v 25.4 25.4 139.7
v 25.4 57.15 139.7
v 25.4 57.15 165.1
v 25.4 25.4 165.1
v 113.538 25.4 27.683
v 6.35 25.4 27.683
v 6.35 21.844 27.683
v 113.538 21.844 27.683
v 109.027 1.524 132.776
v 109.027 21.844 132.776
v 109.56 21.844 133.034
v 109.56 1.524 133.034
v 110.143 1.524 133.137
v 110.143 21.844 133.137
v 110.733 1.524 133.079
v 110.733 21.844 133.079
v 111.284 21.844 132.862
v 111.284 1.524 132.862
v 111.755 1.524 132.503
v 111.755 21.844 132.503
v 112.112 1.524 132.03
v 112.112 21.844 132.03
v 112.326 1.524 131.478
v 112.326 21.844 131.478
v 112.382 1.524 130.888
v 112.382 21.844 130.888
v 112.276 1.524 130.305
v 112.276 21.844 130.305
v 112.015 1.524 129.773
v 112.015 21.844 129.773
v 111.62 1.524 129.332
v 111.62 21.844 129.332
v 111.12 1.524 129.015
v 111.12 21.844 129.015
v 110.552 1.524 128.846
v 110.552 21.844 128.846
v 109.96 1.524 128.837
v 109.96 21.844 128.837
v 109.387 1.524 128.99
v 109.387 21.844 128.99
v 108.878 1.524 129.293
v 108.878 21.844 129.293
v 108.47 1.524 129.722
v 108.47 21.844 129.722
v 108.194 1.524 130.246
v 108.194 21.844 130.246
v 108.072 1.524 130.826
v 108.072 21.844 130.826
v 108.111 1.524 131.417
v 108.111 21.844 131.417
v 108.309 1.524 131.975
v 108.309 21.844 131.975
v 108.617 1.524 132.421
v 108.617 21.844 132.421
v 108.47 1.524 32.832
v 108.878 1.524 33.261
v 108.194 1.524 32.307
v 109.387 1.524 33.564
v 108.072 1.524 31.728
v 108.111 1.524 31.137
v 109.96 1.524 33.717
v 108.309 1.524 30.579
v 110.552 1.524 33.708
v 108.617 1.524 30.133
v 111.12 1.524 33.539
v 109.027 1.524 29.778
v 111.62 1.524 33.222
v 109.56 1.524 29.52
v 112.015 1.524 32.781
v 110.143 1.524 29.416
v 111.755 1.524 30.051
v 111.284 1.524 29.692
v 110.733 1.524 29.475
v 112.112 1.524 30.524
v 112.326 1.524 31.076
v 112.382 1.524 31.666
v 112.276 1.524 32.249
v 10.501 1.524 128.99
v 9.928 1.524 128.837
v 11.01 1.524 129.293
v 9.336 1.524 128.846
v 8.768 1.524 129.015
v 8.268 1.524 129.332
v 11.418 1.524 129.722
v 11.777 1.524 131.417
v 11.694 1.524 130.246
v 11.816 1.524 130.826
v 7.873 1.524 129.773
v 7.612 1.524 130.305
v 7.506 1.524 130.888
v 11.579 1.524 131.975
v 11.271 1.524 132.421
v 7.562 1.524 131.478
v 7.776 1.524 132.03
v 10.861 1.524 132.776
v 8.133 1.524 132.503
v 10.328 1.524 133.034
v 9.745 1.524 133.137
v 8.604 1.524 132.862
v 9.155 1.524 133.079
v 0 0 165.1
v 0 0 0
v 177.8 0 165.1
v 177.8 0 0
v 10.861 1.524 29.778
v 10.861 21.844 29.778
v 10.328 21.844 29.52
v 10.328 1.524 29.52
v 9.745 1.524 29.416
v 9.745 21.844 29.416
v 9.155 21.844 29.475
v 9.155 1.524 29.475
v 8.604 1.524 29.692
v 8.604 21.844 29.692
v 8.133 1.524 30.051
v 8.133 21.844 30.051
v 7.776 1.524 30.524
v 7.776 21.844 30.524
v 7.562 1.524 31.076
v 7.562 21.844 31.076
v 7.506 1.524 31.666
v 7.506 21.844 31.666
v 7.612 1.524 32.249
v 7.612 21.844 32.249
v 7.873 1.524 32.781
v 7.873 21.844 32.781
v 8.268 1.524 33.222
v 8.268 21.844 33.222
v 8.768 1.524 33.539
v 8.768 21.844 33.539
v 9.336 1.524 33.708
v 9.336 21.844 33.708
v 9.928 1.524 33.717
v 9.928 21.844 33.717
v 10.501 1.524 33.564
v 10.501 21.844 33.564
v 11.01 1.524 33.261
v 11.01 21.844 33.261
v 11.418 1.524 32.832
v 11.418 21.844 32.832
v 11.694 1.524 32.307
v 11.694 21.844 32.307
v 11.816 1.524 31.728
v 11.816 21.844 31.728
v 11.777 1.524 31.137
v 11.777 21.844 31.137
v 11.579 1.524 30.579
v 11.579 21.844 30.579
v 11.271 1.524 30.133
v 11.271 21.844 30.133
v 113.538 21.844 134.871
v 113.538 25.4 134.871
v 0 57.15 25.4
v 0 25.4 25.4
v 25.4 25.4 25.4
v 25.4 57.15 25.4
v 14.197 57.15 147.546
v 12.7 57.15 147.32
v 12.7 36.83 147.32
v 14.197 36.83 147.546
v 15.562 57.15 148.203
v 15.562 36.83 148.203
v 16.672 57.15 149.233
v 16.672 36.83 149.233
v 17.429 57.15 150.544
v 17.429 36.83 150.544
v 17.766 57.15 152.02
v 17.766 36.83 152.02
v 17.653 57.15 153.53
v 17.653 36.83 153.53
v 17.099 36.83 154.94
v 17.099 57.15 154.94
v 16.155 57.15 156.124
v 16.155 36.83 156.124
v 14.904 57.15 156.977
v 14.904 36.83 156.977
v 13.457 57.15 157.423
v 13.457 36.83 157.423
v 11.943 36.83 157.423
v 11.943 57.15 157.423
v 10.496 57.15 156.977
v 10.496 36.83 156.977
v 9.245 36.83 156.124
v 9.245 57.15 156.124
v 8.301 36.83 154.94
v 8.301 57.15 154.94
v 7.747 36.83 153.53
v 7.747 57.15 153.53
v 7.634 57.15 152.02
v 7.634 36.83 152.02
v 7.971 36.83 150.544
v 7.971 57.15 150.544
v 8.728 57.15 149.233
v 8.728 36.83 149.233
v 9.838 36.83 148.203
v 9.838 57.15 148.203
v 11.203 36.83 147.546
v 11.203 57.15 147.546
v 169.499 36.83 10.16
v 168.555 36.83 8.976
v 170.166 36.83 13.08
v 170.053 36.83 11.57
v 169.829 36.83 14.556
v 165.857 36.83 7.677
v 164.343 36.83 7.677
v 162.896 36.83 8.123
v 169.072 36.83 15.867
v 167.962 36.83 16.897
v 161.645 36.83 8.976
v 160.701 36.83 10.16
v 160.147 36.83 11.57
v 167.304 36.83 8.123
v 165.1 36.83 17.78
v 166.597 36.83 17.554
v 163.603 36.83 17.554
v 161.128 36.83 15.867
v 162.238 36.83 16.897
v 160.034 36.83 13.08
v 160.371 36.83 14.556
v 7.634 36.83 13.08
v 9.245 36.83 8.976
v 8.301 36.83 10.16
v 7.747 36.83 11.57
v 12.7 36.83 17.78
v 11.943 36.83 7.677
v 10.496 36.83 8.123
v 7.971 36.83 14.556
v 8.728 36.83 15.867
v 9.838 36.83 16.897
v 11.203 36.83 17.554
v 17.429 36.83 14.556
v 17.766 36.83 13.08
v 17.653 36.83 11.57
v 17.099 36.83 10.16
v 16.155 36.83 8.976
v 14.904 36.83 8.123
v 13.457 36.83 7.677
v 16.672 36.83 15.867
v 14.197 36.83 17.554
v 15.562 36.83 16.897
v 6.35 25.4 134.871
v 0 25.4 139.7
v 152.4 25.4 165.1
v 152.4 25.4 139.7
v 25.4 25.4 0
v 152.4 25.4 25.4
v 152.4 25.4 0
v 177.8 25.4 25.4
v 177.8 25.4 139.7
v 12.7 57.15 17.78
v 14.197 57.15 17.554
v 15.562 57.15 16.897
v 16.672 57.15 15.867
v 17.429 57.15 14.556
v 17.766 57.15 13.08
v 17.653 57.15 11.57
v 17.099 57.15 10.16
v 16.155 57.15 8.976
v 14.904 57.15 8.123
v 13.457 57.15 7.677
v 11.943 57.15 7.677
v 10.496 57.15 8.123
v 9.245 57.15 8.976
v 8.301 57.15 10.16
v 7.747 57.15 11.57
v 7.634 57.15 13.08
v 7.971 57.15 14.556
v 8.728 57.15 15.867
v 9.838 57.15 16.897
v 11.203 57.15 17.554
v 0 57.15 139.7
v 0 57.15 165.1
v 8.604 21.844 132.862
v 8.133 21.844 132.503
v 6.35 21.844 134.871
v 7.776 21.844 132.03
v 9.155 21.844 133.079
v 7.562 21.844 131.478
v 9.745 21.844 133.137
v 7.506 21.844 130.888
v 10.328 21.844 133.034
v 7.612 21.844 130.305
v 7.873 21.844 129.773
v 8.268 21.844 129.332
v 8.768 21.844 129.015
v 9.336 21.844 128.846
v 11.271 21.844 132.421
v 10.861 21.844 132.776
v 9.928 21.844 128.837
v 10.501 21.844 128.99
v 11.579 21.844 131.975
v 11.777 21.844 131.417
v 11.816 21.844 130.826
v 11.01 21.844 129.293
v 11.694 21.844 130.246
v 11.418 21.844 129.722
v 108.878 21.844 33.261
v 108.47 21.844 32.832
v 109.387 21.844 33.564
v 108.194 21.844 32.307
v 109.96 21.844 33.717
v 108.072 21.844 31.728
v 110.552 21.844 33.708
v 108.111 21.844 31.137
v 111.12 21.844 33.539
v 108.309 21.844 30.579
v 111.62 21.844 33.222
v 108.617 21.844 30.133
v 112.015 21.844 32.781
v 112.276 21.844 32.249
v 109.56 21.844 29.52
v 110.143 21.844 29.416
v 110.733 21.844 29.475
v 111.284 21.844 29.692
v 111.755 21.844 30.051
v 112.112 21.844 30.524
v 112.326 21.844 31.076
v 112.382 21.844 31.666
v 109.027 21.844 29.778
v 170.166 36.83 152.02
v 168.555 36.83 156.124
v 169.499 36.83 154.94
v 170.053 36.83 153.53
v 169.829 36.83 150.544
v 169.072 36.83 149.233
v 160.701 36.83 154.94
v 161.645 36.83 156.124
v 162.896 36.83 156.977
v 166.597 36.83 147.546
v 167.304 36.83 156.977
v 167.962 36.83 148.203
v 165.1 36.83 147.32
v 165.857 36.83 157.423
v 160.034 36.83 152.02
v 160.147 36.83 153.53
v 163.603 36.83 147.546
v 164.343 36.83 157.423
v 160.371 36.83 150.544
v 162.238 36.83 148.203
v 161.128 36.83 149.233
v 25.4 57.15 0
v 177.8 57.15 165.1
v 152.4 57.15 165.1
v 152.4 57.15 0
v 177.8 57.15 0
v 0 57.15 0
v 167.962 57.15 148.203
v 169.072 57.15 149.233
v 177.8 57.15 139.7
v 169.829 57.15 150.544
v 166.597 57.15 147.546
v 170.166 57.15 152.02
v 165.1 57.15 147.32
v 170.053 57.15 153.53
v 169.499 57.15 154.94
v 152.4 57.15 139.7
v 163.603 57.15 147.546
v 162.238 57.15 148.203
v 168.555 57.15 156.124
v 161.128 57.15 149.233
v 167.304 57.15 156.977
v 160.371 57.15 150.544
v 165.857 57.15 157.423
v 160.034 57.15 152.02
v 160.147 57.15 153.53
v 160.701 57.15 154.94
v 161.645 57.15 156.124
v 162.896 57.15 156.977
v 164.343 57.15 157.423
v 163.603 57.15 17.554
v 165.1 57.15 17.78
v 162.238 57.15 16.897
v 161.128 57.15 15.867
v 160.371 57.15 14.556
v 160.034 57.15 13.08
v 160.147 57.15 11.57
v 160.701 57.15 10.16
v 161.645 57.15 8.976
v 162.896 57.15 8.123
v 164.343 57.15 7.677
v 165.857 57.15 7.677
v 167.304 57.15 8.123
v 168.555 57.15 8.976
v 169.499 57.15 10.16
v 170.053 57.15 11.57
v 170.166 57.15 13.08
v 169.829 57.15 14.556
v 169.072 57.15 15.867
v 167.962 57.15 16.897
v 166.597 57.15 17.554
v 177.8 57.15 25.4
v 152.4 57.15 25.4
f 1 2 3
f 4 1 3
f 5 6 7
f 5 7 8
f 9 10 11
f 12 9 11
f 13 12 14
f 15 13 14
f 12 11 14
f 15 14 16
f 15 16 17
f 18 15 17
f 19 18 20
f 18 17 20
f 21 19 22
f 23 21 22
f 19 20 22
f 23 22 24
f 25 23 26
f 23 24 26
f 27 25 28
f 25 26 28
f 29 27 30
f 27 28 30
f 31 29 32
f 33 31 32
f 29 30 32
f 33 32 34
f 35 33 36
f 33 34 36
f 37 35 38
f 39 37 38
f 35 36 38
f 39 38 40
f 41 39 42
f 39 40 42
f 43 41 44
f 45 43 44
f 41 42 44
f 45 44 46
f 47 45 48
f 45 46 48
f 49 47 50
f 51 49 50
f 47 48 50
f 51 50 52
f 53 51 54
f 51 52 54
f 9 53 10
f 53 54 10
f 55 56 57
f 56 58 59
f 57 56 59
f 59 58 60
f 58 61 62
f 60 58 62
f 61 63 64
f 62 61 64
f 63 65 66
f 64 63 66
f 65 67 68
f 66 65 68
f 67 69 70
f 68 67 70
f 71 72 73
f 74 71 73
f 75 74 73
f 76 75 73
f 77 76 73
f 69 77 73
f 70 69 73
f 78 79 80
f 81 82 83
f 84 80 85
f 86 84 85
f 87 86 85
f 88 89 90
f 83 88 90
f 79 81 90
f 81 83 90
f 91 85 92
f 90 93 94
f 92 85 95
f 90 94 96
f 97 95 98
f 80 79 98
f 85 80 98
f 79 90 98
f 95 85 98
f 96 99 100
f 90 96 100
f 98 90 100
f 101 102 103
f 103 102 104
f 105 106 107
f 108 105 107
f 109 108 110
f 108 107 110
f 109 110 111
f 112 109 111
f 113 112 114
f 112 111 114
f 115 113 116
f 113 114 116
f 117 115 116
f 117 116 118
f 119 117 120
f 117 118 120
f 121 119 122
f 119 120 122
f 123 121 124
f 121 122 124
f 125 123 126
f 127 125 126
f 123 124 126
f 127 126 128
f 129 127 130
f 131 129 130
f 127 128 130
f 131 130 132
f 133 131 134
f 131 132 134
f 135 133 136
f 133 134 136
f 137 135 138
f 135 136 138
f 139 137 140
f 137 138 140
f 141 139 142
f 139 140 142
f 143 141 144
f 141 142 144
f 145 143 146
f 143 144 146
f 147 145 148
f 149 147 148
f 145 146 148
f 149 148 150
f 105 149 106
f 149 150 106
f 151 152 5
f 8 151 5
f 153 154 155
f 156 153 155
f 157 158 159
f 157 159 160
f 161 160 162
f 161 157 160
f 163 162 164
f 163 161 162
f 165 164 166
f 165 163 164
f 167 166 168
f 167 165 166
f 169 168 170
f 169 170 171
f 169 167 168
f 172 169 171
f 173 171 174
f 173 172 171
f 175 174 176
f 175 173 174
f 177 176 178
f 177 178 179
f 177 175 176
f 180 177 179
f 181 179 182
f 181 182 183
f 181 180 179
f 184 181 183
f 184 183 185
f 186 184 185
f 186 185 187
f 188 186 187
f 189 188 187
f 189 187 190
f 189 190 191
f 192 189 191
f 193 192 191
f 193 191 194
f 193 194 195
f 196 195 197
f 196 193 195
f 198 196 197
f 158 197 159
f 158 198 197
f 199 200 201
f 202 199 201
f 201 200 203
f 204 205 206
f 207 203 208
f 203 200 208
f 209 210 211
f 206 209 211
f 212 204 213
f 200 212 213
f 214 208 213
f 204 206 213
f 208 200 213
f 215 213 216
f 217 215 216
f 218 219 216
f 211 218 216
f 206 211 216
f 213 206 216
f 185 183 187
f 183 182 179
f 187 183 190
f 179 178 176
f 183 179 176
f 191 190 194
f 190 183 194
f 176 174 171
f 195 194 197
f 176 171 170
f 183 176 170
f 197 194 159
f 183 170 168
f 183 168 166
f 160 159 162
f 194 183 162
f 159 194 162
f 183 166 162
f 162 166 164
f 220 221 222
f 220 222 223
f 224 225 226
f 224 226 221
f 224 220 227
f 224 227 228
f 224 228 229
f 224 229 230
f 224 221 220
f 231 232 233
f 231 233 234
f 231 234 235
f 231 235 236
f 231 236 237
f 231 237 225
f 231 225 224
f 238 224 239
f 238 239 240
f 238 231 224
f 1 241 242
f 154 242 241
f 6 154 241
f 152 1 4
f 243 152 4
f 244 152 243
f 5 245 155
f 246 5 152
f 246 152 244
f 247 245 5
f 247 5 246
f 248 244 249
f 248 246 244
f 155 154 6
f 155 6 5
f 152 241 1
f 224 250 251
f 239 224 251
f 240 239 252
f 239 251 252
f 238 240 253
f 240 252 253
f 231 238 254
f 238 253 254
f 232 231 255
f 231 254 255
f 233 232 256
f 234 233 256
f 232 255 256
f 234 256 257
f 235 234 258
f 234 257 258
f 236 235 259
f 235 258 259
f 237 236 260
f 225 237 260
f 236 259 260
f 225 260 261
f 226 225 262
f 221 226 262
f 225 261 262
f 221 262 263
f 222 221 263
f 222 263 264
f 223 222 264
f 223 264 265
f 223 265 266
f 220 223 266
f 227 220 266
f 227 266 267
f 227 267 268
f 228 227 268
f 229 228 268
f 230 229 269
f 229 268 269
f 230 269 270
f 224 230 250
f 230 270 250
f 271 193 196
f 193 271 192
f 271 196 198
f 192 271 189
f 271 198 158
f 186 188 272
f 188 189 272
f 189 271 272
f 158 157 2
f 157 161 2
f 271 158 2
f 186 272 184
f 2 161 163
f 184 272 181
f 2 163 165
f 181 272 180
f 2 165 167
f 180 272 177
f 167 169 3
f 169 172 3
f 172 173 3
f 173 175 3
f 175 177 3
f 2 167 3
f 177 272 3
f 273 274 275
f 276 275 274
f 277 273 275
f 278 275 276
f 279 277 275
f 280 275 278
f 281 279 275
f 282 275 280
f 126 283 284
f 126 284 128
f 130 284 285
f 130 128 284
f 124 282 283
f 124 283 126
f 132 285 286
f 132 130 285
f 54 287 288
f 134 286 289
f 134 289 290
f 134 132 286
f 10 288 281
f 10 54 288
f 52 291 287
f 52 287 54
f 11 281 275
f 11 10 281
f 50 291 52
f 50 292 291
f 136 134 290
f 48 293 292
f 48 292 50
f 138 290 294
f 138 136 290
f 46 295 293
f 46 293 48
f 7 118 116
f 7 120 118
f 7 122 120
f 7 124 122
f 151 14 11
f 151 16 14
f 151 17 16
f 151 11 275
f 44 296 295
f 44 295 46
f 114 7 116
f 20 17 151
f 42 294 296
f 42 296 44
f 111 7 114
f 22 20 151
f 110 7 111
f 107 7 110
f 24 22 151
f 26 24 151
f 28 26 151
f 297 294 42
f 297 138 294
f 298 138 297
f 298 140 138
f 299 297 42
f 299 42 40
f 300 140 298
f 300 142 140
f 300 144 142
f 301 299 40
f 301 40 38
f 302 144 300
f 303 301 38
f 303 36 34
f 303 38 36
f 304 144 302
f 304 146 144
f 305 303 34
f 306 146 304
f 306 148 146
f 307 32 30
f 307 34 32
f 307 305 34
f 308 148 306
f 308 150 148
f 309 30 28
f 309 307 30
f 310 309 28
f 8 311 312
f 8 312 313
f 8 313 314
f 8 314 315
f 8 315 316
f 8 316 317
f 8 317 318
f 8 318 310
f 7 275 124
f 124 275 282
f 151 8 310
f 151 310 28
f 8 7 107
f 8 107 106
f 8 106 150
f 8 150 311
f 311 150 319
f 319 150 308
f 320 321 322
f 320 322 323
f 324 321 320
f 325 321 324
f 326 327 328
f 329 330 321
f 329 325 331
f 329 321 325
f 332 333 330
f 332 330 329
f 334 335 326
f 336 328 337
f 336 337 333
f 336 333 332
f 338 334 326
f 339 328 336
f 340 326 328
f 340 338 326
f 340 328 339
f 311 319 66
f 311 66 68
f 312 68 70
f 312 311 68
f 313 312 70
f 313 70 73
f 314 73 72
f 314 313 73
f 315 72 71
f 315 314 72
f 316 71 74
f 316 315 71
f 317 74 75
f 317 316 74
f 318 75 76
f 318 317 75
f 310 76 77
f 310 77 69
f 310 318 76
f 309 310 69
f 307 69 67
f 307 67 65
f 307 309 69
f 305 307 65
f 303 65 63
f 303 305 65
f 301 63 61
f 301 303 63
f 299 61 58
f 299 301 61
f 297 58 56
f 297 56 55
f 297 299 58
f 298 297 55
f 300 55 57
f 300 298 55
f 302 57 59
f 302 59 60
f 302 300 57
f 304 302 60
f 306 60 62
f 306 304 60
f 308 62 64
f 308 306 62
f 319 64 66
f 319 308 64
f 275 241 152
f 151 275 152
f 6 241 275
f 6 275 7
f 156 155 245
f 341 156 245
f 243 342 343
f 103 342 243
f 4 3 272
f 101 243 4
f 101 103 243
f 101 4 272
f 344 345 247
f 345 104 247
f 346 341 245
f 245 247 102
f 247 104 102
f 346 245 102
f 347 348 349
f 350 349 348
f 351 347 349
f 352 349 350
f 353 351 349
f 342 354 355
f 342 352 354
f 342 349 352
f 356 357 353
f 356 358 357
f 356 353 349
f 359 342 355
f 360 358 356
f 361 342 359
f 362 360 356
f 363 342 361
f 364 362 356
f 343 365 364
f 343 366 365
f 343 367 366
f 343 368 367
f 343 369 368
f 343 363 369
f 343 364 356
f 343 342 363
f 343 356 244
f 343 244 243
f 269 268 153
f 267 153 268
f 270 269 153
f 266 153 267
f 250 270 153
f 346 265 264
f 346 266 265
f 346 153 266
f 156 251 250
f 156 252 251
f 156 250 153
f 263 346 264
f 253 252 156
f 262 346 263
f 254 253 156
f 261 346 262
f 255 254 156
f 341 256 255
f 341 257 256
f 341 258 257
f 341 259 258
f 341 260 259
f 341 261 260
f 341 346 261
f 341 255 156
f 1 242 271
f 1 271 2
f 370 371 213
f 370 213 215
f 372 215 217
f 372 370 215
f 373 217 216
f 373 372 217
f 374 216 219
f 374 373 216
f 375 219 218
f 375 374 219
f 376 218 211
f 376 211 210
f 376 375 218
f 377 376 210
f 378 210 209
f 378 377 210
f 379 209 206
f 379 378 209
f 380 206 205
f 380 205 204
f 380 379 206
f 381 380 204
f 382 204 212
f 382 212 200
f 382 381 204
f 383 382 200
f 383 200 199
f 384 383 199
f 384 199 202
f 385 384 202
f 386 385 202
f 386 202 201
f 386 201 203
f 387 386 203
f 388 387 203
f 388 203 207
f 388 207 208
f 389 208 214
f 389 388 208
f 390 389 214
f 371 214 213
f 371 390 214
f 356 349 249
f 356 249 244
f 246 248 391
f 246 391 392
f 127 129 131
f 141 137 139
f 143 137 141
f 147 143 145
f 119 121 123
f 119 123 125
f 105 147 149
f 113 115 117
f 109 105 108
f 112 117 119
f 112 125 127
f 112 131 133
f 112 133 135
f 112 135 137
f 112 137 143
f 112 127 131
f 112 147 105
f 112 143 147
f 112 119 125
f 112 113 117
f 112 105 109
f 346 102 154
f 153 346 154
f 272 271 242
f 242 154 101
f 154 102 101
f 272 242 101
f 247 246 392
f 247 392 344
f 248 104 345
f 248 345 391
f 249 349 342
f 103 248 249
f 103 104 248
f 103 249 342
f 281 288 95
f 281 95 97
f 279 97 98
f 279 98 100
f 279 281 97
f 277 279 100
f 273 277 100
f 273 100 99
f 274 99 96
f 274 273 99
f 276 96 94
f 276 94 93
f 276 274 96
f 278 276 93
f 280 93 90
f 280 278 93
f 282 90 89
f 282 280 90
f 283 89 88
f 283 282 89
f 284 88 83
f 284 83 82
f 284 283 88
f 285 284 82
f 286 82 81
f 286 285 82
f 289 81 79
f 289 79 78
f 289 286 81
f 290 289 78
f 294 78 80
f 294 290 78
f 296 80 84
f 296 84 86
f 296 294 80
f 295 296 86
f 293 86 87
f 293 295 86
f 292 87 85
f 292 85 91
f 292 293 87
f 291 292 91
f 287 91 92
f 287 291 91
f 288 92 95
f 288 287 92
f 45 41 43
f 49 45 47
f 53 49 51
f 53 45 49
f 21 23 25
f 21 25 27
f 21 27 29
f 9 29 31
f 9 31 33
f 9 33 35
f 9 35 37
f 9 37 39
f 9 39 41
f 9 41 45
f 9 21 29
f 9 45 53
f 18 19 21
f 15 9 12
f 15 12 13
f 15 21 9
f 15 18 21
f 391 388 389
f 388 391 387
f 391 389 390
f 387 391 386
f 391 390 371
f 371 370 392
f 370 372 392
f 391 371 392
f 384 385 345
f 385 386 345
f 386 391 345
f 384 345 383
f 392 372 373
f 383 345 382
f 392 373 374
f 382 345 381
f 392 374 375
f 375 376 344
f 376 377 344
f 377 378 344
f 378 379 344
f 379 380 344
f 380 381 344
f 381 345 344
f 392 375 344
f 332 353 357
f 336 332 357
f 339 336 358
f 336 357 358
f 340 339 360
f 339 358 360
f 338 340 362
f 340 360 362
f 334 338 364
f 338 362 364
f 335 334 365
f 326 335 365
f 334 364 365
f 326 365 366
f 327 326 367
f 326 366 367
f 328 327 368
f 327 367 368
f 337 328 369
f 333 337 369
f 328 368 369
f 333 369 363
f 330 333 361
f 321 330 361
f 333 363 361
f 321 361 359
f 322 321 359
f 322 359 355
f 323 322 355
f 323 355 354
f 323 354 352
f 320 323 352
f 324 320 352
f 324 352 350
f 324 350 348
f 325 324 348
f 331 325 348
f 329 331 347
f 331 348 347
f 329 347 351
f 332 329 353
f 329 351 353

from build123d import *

# Parameters (mm, degrees)
SKETCH2_W                = 177.8
SKETCH2_H                = 165.1
BOSS_EXTRUDE1_DEPTH      = 25.4
SKETCH6_W                = 25.4
SKETCH6_H                = 25.4
BOSS_EXTRUDE2_DEPTH      = 31.75
MIRROR2_COPY_1_SKETCH_W  = 25.4
MIRROR2_COPY_1_SKETCH_H  = 25.4
MIRROR2_COPY_1_DEPTH     = 31.75
MIRROR2_COPY_2_SKETCH_W  = 25.4
MIRROR2_COPY_2_SKETCH_H  = 25.4
MIRROR2_COPY_2_DEPTH     = 31.75
SKETCH9_W                = 107.188
SKETCH9_H                = 107.188
CUT_EXTRUDE3_DEPTH       = 3.556
SKETCH10_RX              = 2.159
SKETCH10_RY              = 2.159
CUT_EXTRUDE4_DEPTH       = 20.32
MIRROR4_COPY_1_SKETCH_RX = 2.159
MIRROR4_COPY_1_SKETCH_RY = 2.159
MIRROR4_COPY_1_DEPTH     = 20.32
MIRROR4_COPY_2_SKETCH_RX = 2.159
MIRROR4_COPY_2_SKETCH_RY = 2.159
MIRROR4_COPY_2_DEPTH     = 20.32
SKETCH14_R               = 5.08
CUT_EXTRUDE5_DEPTH       = 20.32
MIRROR6_COPY_1_SKETCH_R  = 5.08
MIRROR6_COPY_1_DEPTH     = 20.32
MIRROR6_COPY_2_SKETCH_R  = 5.08
MIRROR6_COPY_2_DEPTH     = 20.32


with BuildPart() as part:
    # Sketch2 → Boss-Extrude1 (new body)
    with BuildSketch(Plane(origin=(0, 0, 0), x_dir=(1, 0, 0), z_dir=(0, 1, 0))):
        with Locations((88.9, -82.55)):
            Rectangle(SKETCH2_W, SKETCH2_H)
    extrude(amount=BOSS_EXTRUDE1_DEPTH)

    # Sketch6 → Boss-Extrude2 (add)
    with BuildSketch(Plane(origin=(0, 25.4, 0), x_dir=(1, 0, 0), z_dir=(0, 1, 0))):
        with Locations((12.7, -12.7)):
            Rectangle(SKETCH6_W, SKETCH6_H)
    boss_extrude2 = extrude(amount=BOSS_EXTRUDE2_DEPTH)

    # Mirror1: Boss-Extrude2 across plane
    add(boss_extrude2.mirror(Plane(origin=(0, 0, 82.55), x_dir=(1, 0, 0), z_dir=(0, 0, -1))))

    # Mirror2 copy 1 sketch → Mirror2 copy 1 (add)
    with BuildSketch(Plane(origin=(177.8, 25.4, 165.1), x_dir=(-1, 0, 0), z_dir=(0, 1, 0))):
        with Locations((12.7, -12.7)):
            Rectangle(MIRROR2_COPY_1_SKETCH_W, MIRROR2_COPY_1_SKETCH_H)
    extrude(amount=MIRROR2_COPY_1_DEPTH)

    # Mirror2 copy 2 sketch → Mirror2 copy 2 (add)
    with BuildSketch(Plane(origin=(177.8, 25.4, 0), x_dir=(-1, 0, 0), z_dir=(0, 1, 0))):
        with Locations((12.7, 12.7)):
            Rectangle(MIRROR2_COPY_2_SKETCH_W, MIRROR2_COPY_2_SKETCH_H)
    extrude(amount=MIRROR2_COPY_2_DEPTH)

    # Sketch9 → Cut-Extrude3 (cut)
    with BuildSketch(Plane(origin=(0, 25.4, 0), x_dir=(1, 0, 0), z_dir=(0, 1, 0))):
        with Locations((59.944, -81.276983136)):
            Rectangle(SKETCH9_W, SKETCH9_H)
    extrude(amount=-CUT_EXTRUDE3_DEPTH, mode=Mode.SUBTRACT)

    # Sketch10 → Cut-Extrude4 (cut)
    with BuildSketch(Plane(origin=(0, 21.844, 0), x_dir=(1, 0, 0), z_dir=(0, 1, 0))):
        with Locations(Location((9.662951288, -31.573935809), (0, 0, 56.28607255))):
            Ellipse(SKETCH10_RX, SKETCH10_RY)
    cut_extrude4 = extrude(amount=-CUT_EXTRUDE4_DEPTH, mode=Mode.SUBTRACT)

    # Mirror3: Cut-Extrude4 across plane
    add(cut_extrude4.mirror(Plane.XY.offset(81.276983136)), mode=Mode.SUBTRACT)

    # Mirror4 copy 1 sketch → Mirror4 copy 1 (cut)
    with BuildSketch(Plane(origin=(119.888, 21.844, 162.553966273), x_dir=(-1, 0, 0), z_dir=(0, 1, 0))):
        with Locations(Location((9.662951288, -31.573935809), (0, 0, 56.28607255))):
            Ellipse(MIRROR4_COPY_1_SKETCH_RX, MIRROR4_COPY_1_SKETCH_RY)
    extrude(amount=-MIRROR4_COPY_1_DEPTH, mode=Mode.SUBTRACT)

    # Mirror4 copy 2 sketch → Mirror4 copy 2 (cut)
    with BuildSketch(Plane(origin=(119.888, 21.844, 0), x_dir=(-1, 0, 0), z_dir=(0, 1, 0))):
        with Locations(Location((9.662951288, 31.573935809), (0, 0, -56.28607255))):
            Ellipse(MIRROR4_COPY_2_SKETCH_RX, MIRROR4_COPY_2_SKETCH_RY)
    extrude(amount=-MIRROR4_COPY_2_DEPTH, mode=Mode.SUBTRACT)

    # Sketch14 → Cut-Extrude5 (cut)
    with BuildSketch(Plane(origin=(0, 57.15, 0), x_dir=(1, 0, 0), z_dir=(0, 1, 0))):
        with Locations((12.7, -12.7)):
            Circle(SKETCH14_R)
    cut_extrude5 = extrude(amount=-CUT_EXTRUDE5_DEPTH, mode=Mode.SUBTRACT)

    # Mirror5: Cut-Extrude5 across plane
    add(cut_extrude5.mirror(Plane.ZY.offset(-88.9)), mode=Mode.SUBTRACT)

    # Mirror6 copy 1 sketch → Mirror6 copy 1 (cut)
    with BuildSketch(Plane(origin=(177.8, 57.15, 165.1), x_dir=(-1, 0, 0), z_dir=(0, 1, 0))):
        with Locations((12.7, -12.7)):
            Circle(MIRROR6_COPY_1_SKETCH_R)
    extrude(amount=-MIRROR6_COPY_1_DEPTH, mode=Mode.SUBTRACT)

    # Mirror6 copy 2 sketch → Mirror6 copy 2 (cut)
    with BuildSketch(Plane(origin=(0, 57.15, 165.1), x_dir=(1, 0, 0), z_dir=(0, 1, 0))):
        with Locations((12.7, 12.7)):
            Circle(MIRROR6_COPY_2_SKETCH_R)
    extrude(amount=-MIRROR6_COPY_2_DEPTH, mode=Mode.SUBTRACT)


solid = part.part
